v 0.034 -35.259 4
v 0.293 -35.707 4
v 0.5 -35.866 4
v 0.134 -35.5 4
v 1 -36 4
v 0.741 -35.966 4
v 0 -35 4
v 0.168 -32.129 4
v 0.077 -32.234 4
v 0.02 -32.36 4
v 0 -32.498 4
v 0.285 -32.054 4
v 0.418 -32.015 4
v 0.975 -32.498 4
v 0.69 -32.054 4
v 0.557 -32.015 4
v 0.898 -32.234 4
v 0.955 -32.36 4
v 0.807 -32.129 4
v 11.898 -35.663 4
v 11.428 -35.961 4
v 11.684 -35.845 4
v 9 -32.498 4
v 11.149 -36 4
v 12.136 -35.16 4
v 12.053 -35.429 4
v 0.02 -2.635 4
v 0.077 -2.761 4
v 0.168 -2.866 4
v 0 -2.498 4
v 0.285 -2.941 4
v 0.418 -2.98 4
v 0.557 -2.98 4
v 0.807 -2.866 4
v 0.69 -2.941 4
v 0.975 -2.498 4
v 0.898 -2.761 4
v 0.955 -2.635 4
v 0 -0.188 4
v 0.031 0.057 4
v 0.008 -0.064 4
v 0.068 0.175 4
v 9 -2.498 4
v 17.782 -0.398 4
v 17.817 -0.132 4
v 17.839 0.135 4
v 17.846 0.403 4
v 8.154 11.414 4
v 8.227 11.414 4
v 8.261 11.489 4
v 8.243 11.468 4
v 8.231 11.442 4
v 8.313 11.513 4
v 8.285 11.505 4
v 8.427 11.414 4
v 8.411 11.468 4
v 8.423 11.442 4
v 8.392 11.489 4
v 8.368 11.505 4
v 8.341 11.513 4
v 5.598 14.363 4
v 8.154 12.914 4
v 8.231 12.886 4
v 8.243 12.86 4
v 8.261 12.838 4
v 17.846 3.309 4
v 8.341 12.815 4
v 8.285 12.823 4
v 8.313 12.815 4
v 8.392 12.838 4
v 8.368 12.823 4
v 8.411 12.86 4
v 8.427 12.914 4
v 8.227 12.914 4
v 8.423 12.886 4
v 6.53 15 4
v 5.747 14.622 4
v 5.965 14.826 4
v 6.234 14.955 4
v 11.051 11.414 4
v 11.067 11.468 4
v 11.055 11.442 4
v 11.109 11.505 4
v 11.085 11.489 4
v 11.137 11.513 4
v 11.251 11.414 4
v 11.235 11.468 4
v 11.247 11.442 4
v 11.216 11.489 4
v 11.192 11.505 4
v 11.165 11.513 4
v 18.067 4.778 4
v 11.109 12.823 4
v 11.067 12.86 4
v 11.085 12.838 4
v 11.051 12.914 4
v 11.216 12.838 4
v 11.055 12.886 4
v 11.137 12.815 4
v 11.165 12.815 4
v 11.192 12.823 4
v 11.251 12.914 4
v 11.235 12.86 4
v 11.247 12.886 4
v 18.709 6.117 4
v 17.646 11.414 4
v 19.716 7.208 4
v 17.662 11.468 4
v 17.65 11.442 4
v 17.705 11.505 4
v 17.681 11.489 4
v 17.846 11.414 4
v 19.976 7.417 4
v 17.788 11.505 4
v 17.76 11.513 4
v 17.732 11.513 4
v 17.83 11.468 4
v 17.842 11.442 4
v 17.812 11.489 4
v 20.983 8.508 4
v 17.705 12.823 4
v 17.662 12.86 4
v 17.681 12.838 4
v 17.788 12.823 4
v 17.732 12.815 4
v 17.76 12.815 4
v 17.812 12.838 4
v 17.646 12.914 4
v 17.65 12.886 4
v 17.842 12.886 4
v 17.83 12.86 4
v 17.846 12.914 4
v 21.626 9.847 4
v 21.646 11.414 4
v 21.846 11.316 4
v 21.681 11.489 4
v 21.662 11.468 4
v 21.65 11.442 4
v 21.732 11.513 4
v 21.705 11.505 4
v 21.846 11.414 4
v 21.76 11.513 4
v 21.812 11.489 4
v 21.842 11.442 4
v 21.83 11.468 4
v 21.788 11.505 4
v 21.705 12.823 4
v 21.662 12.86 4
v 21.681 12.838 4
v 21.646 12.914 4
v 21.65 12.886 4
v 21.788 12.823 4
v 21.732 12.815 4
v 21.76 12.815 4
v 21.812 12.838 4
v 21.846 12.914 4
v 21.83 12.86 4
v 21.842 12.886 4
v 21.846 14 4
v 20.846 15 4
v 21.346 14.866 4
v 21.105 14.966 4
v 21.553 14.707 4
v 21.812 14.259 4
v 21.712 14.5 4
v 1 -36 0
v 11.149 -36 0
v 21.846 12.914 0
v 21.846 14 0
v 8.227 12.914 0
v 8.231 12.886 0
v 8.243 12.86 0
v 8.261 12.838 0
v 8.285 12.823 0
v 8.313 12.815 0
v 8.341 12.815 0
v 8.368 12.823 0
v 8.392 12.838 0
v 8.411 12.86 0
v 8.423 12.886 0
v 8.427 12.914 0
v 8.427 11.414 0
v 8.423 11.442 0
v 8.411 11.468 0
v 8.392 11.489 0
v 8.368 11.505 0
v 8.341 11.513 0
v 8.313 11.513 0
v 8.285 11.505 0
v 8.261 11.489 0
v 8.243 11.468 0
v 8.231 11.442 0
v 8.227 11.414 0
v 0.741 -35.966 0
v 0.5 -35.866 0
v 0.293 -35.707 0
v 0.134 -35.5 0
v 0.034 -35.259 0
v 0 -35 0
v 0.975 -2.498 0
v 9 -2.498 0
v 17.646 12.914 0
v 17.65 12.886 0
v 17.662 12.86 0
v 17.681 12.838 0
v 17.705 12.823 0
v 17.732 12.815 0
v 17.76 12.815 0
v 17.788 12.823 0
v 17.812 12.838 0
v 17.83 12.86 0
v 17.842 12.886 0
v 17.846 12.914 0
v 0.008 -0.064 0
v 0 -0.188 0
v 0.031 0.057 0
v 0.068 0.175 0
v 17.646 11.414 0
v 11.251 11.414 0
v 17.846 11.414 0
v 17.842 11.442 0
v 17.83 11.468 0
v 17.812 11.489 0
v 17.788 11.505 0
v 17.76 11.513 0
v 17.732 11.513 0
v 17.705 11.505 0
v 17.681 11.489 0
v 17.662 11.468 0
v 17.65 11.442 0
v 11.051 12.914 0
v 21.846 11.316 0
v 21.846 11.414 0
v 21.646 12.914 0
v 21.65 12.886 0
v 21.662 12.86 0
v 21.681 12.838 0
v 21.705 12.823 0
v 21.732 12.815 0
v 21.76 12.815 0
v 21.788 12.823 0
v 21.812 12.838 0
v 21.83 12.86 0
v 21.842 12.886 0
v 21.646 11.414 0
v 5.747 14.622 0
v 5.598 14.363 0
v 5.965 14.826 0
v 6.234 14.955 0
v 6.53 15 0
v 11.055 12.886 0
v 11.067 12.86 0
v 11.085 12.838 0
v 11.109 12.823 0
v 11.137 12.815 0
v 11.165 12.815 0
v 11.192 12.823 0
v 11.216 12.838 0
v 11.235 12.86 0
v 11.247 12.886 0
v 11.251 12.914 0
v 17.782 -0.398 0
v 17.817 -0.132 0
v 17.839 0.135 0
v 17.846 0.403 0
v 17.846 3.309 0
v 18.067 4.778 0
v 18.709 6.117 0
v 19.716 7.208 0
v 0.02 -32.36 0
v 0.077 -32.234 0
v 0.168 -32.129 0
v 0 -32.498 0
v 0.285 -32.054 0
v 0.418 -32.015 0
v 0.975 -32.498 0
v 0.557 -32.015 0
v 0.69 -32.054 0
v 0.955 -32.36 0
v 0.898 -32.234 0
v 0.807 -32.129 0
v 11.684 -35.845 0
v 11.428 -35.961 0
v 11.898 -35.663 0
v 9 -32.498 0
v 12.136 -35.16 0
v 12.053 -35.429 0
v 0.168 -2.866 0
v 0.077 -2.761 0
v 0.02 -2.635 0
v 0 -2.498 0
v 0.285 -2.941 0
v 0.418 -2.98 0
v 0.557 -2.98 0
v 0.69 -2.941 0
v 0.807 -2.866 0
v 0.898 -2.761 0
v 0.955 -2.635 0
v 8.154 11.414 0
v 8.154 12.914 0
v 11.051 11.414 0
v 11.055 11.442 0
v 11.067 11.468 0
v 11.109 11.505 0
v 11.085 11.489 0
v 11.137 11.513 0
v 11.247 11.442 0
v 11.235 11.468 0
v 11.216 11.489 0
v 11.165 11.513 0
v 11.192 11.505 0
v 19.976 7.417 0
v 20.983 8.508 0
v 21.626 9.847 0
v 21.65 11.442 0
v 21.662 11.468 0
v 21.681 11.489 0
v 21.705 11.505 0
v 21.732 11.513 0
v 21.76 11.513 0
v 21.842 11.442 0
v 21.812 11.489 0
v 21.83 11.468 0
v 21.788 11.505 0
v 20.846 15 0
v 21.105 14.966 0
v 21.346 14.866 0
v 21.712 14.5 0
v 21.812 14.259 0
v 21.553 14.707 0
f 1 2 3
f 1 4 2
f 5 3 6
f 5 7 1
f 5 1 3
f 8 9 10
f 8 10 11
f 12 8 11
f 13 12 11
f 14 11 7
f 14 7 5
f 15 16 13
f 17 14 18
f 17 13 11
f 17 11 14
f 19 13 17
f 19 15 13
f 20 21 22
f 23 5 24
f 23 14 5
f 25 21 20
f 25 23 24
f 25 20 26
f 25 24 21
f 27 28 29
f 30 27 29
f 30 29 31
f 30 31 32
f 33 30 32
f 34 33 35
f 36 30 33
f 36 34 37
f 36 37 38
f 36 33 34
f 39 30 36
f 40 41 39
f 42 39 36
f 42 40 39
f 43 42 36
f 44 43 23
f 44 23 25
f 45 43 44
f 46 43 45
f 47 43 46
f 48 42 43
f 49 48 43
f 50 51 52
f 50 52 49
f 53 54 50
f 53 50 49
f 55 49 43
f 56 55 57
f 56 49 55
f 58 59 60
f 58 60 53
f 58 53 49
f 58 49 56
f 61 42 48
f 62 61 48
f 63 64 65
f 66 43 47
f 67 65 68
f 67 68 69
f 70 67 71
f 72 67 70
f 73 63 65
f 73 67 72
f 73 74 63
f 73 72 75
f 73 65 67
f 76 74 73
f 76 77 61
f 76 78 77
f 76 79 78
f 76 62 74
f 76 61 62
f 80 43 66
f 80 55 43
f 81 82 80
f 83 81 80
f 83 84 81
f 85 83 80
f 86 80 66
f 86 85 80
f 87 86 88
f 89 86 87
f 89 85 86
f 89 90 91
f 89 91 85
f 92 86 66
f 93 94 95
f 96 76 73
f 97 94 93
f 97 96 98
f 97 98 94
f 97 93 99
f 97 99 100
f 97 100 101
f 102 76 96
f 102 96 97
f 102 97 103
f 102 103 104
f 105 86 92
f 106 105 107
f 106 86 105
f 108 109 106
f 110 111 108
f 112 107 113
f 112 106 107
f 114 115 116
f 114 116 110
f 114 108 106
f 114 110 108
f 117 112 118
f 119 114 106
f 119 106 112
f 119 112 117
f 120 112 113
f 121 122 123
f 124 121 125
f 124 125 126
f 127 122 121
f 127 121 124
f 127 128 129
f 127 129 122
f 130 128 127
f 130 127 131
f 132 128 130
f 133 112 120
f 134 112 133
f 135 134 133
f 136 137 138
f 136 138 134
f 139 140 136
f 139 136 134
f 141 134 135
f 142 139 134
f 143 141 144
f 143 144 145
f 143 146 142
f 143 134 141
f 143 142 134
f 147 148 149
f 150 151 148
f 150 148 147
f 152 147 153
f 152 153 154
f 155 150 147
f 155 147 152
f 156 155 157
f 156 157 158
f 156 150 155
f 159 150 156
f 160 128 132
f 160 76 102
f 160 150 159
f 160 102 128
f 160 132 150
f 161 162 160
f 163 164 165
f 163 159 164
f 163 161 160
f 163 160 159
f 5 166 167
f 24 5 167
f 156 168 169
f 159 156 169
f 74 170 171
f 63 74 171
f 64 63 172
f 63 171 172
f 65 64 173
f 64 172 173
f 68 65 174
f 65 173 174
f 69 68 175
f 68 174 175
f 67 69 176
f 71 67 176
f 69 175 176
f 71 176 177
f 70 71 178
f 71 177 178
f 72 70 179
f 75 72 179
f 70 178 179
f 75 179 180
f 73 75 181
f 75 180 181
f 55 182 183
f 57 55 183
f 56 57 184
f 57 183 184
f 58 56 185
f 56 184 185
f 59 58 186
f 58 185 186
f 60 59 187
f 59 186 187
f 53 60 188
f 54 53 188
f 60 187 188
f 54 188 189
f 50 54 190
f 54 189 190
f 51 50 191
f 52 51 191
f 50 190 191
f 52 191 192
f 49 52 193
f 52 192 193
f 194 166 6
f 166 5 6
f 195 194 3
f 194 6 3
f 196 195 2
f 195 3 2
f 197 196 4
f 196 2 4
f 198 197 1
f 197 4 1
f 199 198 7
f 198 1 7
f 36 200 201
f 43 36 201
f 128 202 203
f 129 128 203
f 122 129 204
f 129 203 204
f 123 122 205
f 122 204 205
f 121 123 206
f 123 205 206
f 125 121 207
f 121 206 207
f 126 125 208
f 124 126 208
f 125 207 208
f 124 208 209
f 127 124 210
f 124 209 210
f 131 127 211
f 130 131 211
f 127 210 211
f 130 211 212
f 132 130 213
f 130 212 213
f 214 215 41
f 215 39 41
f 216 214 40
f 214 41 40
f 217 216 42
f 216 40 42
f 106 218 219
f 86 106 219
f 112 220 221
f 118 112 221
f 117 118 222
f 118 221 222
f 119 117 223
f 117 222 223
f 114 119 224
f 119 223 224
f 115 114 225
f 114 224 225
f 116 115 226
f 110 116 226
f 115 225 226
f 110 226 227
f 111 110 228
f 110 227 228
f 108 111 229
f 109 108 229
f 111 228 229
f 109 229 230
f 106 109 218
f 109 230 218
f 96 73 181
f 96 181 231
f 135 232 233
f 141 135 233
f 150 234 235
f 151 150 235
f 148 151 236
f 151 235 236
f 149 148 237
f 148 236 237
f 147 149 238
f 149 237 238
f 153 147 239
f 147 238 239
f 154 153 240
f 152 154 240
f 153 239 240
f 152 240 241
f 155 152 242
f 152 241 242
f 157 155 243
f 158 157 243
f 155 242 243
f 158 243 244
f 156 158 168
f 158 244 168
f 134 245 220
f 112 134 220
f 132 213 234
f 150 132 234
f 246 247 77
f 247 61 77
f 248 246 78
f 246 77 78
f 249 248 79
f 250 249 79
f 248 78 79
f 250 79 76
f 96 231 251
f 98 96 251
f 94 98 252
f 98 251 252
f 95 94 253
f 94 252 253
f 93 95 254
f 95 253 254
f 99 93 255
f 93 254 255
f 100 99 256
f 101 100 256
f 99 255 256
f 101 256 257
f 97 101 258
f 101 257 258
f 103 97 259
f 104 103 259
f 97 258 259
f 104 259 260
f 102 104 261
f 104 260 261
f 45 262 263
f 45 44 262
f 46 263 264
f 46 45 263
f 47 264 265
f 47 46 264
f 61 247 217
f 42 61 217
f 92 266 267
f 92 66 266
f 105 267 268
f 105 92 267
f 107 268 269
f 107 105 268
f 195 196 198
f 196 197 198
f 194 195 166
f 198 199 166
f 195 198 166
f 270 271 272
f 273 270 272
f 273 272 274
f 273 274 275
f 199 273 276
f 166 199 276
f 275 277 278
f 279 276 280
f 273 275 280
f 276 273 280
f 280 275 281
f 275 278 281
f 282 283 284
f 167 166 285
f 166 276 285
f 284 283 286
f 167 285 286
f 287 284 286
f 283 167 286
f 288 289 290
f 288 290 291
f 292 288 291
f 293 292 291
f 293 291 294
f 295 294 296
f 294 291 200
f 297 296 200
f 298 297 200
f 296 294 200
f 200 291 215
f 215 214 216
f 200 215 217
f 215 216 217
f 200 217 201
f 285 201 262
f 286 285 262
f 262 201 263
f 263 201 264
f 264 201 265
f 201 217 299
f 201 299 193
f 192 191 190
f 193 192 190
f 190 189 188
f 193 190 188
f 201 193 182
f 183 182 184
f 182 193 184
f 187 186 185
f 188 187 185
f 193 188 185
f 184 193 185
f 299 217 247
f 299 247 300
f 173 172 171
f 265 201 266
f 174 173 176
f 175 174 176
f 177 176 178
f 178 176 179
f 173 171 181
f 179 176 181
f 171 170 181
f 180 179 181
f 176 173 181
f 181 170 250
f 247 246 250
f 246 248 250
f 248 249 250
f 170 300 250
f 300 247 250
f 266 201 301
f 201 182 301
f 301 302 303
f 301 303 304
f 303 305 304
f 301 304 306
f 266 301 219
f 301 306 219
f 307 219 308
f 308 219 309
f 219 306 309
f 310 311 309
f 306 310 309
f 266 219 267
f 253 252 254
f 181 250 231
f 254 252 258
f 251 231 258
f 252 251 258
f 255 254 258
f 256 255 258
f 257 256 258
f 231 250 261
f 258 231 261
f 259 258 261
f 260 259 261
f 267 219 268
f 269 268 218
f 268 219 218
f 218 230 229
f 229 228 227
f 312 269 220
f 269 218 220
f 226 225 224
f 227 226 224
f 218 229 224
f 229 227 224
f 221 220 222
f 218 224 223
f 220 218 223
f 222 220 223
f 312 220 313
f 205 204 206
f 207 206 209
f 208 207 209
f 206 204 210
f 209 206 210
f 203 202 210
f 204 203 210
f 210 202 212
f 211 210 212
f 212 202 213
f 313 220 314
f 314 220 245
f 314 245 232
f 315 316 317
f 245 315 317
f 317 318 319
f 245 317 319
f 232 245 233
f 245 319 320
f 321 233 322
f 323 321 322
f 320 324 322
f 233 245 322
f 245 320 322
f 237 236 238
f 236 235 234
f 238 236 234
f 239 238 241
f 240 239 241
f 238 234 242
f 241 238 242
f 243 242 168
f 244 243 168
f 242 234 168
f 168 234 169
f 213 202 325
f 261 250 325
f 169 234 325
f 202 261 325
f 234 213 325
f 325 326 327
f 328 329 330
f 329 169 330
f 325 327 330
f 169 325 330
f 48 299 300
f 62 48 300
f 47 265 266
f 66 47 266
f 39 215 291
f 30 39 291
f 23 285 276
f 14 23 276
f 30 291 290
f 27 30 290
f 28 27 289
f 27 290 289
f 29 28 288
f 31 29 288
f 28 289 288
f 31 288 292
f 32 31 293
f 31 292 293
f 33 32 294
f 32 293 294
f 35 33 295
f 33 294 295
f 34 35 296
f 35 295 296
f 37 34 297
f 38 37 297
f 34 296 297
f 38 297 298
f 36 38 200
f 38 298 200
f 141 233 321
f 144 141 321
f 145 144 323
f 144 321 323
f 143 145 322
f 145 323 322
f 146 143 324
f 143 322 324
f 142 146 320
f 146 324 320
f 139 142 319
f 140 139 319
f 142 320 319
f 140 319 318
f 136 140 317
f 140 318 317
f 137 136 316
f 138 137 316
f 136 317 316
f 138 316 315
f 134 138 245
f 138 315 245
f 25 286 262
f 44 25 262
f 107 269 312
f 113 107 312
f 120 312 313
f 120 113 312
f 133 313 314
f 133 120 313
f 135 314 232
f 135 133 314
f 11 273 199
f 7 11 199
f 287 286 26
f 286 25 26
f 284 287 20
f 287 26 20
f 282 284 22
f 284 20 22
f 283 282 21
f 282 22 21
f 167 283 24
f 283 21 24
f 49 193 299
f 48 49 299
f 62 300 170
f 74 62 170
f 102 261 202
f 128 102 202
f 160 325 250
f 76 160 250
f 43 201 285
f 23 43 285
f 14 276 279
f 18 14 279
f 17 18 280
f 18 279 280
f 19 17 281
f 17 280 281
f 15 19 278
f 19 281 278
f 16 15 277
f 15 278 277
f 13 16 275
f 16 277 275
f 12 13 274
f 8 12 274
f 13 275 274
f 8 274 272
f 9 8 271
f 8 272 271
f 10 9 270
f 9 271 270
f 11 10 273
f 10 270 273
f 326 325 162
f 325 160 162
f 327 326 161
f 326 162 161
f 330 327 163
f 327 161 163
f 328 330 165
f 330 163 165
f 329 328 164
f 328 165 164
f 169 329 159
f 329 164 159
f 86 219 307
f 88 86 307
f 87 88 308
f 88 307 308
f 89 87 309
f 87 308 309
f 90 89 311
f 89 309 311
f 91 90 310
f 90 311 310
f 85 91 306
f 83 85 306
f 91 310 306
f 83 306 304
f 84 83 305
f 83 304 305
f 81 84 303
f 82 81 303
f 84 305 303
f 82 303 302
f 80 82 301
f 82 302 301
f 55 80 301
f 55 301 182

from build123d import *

# Parameters (mm, degrees)
F1_DEPTH = 4
F2_R     = 5
F3_R     = 1


with BuildPart() as f1:
    # F0 (on Top) → F1 (new body)
    with BuildSketch(Plane.XY):
        with BuildLine():
            Line((5.846258, 15), (0, 0))
            Line((0, 0), (0, -2.497575))
            ThreePointArc((0, -2.497575), (0.487616, -2.985192), (0.975233, -2.497575))
            Line((0.975233, -2.497575), (9, -2.497575))
            Line((9, -2.497575), (9, -32.497575))
            Line((9, -32.497575), (0.975233, -32.497575))
            ThreePointArc((0.975233, -32.497575), (0.487616, -32.009959), (0, -32.497575))
            Line((0, -32.497575), (0, -36))
            Line((0, -36), (12, -36))
            Line((12, -36), (17.846258, 0))
            Line((17.846258, 0), (17.846258, 5.706935))
            Line((17.846258, 5.706935), (21.846258, 8.917766))
            Line((21.846258, 8.917766), (21.846258, 11.413869))
            ThreePointArc((21.846258, 11.413869), (21.746258, 11.513869), (21.646258, 11.413869))
            Line((21.646258, 11.413869), (17.846258, 11.413869))
            ThreePointArc((17.846258, 11.413869), (17.746258, 11.513869), (17.646258, 11.413869))
            Line((17.646258, 11.413869), (11.250778, 11.413869))
            ThreePointArc((11.250778, 11.413869), (11.150778, 11.513869), (11.050778, 11.413869))
            Line((11.050778, 11.413869), (8.426733, 11.413869))
            ThreePointArc((8.426733, 11.413869), (8.326733, 11.513869), (8.226733, 11.413869))
            Line((8.226733, 11.413869), (8.153742, 11.413869))
            Line((8.153742, 11.413869), (8.153742, 12.913869))
            Line((8.153742, 12.913869), (8.226733, 12.913869))
            ThreePointArc((8.226733, 12.913869), (8.326733, 12.813869), (8.426733, 12.913869))
            Line((8.426733, 12.913869), (11.050778, 12.913869))
            ThreePointArc((11.050778, 12.913869), (11.150778, 12.813869), (11.250778, 12.913869))
            Line((11.250778, 12.913869), (17.646258, 12.913869))
            ThreePointArc((17.646258, 12.913869), (17.746258, 12.813869), (17.846258, 12.913869))
            Line((17.846258, 12.913869), (21.646258, 12.913869))
            ThreePointArc((21.646258, 12.913869), (21.746258, 12.813869), (21.846258, 12.913869))
            Line((21.846258, 12.913869), (21.846258, 15))
            Line((21.846258, 15), (17.846258, 15))
            Line((17.846258, 15), (5.846258, 15))
        make_face()
    extrude(amount=F1_DEPTH)

    # F2
    f2_edges = [f1.edges().sort_by_distance(p)[0] for p in [
        (21.846258, 8.917766, 2),
        (17.846258, 5.706935, 2),
        (17.846258, 0, 2),
    ]]
    fillet(f2_edges, radius=F2_R)

    # F3
    f3_edges = [f1.edges().sort_by_distance(p)[0] for p in [
        (21.846258, 15, 2),
        (5.846258, 15, 2),
        (0, 0, 2),
        (12, -36, 2),
        (0, -36, 2),
    ]]
    fillet(f3_edges, radius=F3_R)


solid = f1.part
